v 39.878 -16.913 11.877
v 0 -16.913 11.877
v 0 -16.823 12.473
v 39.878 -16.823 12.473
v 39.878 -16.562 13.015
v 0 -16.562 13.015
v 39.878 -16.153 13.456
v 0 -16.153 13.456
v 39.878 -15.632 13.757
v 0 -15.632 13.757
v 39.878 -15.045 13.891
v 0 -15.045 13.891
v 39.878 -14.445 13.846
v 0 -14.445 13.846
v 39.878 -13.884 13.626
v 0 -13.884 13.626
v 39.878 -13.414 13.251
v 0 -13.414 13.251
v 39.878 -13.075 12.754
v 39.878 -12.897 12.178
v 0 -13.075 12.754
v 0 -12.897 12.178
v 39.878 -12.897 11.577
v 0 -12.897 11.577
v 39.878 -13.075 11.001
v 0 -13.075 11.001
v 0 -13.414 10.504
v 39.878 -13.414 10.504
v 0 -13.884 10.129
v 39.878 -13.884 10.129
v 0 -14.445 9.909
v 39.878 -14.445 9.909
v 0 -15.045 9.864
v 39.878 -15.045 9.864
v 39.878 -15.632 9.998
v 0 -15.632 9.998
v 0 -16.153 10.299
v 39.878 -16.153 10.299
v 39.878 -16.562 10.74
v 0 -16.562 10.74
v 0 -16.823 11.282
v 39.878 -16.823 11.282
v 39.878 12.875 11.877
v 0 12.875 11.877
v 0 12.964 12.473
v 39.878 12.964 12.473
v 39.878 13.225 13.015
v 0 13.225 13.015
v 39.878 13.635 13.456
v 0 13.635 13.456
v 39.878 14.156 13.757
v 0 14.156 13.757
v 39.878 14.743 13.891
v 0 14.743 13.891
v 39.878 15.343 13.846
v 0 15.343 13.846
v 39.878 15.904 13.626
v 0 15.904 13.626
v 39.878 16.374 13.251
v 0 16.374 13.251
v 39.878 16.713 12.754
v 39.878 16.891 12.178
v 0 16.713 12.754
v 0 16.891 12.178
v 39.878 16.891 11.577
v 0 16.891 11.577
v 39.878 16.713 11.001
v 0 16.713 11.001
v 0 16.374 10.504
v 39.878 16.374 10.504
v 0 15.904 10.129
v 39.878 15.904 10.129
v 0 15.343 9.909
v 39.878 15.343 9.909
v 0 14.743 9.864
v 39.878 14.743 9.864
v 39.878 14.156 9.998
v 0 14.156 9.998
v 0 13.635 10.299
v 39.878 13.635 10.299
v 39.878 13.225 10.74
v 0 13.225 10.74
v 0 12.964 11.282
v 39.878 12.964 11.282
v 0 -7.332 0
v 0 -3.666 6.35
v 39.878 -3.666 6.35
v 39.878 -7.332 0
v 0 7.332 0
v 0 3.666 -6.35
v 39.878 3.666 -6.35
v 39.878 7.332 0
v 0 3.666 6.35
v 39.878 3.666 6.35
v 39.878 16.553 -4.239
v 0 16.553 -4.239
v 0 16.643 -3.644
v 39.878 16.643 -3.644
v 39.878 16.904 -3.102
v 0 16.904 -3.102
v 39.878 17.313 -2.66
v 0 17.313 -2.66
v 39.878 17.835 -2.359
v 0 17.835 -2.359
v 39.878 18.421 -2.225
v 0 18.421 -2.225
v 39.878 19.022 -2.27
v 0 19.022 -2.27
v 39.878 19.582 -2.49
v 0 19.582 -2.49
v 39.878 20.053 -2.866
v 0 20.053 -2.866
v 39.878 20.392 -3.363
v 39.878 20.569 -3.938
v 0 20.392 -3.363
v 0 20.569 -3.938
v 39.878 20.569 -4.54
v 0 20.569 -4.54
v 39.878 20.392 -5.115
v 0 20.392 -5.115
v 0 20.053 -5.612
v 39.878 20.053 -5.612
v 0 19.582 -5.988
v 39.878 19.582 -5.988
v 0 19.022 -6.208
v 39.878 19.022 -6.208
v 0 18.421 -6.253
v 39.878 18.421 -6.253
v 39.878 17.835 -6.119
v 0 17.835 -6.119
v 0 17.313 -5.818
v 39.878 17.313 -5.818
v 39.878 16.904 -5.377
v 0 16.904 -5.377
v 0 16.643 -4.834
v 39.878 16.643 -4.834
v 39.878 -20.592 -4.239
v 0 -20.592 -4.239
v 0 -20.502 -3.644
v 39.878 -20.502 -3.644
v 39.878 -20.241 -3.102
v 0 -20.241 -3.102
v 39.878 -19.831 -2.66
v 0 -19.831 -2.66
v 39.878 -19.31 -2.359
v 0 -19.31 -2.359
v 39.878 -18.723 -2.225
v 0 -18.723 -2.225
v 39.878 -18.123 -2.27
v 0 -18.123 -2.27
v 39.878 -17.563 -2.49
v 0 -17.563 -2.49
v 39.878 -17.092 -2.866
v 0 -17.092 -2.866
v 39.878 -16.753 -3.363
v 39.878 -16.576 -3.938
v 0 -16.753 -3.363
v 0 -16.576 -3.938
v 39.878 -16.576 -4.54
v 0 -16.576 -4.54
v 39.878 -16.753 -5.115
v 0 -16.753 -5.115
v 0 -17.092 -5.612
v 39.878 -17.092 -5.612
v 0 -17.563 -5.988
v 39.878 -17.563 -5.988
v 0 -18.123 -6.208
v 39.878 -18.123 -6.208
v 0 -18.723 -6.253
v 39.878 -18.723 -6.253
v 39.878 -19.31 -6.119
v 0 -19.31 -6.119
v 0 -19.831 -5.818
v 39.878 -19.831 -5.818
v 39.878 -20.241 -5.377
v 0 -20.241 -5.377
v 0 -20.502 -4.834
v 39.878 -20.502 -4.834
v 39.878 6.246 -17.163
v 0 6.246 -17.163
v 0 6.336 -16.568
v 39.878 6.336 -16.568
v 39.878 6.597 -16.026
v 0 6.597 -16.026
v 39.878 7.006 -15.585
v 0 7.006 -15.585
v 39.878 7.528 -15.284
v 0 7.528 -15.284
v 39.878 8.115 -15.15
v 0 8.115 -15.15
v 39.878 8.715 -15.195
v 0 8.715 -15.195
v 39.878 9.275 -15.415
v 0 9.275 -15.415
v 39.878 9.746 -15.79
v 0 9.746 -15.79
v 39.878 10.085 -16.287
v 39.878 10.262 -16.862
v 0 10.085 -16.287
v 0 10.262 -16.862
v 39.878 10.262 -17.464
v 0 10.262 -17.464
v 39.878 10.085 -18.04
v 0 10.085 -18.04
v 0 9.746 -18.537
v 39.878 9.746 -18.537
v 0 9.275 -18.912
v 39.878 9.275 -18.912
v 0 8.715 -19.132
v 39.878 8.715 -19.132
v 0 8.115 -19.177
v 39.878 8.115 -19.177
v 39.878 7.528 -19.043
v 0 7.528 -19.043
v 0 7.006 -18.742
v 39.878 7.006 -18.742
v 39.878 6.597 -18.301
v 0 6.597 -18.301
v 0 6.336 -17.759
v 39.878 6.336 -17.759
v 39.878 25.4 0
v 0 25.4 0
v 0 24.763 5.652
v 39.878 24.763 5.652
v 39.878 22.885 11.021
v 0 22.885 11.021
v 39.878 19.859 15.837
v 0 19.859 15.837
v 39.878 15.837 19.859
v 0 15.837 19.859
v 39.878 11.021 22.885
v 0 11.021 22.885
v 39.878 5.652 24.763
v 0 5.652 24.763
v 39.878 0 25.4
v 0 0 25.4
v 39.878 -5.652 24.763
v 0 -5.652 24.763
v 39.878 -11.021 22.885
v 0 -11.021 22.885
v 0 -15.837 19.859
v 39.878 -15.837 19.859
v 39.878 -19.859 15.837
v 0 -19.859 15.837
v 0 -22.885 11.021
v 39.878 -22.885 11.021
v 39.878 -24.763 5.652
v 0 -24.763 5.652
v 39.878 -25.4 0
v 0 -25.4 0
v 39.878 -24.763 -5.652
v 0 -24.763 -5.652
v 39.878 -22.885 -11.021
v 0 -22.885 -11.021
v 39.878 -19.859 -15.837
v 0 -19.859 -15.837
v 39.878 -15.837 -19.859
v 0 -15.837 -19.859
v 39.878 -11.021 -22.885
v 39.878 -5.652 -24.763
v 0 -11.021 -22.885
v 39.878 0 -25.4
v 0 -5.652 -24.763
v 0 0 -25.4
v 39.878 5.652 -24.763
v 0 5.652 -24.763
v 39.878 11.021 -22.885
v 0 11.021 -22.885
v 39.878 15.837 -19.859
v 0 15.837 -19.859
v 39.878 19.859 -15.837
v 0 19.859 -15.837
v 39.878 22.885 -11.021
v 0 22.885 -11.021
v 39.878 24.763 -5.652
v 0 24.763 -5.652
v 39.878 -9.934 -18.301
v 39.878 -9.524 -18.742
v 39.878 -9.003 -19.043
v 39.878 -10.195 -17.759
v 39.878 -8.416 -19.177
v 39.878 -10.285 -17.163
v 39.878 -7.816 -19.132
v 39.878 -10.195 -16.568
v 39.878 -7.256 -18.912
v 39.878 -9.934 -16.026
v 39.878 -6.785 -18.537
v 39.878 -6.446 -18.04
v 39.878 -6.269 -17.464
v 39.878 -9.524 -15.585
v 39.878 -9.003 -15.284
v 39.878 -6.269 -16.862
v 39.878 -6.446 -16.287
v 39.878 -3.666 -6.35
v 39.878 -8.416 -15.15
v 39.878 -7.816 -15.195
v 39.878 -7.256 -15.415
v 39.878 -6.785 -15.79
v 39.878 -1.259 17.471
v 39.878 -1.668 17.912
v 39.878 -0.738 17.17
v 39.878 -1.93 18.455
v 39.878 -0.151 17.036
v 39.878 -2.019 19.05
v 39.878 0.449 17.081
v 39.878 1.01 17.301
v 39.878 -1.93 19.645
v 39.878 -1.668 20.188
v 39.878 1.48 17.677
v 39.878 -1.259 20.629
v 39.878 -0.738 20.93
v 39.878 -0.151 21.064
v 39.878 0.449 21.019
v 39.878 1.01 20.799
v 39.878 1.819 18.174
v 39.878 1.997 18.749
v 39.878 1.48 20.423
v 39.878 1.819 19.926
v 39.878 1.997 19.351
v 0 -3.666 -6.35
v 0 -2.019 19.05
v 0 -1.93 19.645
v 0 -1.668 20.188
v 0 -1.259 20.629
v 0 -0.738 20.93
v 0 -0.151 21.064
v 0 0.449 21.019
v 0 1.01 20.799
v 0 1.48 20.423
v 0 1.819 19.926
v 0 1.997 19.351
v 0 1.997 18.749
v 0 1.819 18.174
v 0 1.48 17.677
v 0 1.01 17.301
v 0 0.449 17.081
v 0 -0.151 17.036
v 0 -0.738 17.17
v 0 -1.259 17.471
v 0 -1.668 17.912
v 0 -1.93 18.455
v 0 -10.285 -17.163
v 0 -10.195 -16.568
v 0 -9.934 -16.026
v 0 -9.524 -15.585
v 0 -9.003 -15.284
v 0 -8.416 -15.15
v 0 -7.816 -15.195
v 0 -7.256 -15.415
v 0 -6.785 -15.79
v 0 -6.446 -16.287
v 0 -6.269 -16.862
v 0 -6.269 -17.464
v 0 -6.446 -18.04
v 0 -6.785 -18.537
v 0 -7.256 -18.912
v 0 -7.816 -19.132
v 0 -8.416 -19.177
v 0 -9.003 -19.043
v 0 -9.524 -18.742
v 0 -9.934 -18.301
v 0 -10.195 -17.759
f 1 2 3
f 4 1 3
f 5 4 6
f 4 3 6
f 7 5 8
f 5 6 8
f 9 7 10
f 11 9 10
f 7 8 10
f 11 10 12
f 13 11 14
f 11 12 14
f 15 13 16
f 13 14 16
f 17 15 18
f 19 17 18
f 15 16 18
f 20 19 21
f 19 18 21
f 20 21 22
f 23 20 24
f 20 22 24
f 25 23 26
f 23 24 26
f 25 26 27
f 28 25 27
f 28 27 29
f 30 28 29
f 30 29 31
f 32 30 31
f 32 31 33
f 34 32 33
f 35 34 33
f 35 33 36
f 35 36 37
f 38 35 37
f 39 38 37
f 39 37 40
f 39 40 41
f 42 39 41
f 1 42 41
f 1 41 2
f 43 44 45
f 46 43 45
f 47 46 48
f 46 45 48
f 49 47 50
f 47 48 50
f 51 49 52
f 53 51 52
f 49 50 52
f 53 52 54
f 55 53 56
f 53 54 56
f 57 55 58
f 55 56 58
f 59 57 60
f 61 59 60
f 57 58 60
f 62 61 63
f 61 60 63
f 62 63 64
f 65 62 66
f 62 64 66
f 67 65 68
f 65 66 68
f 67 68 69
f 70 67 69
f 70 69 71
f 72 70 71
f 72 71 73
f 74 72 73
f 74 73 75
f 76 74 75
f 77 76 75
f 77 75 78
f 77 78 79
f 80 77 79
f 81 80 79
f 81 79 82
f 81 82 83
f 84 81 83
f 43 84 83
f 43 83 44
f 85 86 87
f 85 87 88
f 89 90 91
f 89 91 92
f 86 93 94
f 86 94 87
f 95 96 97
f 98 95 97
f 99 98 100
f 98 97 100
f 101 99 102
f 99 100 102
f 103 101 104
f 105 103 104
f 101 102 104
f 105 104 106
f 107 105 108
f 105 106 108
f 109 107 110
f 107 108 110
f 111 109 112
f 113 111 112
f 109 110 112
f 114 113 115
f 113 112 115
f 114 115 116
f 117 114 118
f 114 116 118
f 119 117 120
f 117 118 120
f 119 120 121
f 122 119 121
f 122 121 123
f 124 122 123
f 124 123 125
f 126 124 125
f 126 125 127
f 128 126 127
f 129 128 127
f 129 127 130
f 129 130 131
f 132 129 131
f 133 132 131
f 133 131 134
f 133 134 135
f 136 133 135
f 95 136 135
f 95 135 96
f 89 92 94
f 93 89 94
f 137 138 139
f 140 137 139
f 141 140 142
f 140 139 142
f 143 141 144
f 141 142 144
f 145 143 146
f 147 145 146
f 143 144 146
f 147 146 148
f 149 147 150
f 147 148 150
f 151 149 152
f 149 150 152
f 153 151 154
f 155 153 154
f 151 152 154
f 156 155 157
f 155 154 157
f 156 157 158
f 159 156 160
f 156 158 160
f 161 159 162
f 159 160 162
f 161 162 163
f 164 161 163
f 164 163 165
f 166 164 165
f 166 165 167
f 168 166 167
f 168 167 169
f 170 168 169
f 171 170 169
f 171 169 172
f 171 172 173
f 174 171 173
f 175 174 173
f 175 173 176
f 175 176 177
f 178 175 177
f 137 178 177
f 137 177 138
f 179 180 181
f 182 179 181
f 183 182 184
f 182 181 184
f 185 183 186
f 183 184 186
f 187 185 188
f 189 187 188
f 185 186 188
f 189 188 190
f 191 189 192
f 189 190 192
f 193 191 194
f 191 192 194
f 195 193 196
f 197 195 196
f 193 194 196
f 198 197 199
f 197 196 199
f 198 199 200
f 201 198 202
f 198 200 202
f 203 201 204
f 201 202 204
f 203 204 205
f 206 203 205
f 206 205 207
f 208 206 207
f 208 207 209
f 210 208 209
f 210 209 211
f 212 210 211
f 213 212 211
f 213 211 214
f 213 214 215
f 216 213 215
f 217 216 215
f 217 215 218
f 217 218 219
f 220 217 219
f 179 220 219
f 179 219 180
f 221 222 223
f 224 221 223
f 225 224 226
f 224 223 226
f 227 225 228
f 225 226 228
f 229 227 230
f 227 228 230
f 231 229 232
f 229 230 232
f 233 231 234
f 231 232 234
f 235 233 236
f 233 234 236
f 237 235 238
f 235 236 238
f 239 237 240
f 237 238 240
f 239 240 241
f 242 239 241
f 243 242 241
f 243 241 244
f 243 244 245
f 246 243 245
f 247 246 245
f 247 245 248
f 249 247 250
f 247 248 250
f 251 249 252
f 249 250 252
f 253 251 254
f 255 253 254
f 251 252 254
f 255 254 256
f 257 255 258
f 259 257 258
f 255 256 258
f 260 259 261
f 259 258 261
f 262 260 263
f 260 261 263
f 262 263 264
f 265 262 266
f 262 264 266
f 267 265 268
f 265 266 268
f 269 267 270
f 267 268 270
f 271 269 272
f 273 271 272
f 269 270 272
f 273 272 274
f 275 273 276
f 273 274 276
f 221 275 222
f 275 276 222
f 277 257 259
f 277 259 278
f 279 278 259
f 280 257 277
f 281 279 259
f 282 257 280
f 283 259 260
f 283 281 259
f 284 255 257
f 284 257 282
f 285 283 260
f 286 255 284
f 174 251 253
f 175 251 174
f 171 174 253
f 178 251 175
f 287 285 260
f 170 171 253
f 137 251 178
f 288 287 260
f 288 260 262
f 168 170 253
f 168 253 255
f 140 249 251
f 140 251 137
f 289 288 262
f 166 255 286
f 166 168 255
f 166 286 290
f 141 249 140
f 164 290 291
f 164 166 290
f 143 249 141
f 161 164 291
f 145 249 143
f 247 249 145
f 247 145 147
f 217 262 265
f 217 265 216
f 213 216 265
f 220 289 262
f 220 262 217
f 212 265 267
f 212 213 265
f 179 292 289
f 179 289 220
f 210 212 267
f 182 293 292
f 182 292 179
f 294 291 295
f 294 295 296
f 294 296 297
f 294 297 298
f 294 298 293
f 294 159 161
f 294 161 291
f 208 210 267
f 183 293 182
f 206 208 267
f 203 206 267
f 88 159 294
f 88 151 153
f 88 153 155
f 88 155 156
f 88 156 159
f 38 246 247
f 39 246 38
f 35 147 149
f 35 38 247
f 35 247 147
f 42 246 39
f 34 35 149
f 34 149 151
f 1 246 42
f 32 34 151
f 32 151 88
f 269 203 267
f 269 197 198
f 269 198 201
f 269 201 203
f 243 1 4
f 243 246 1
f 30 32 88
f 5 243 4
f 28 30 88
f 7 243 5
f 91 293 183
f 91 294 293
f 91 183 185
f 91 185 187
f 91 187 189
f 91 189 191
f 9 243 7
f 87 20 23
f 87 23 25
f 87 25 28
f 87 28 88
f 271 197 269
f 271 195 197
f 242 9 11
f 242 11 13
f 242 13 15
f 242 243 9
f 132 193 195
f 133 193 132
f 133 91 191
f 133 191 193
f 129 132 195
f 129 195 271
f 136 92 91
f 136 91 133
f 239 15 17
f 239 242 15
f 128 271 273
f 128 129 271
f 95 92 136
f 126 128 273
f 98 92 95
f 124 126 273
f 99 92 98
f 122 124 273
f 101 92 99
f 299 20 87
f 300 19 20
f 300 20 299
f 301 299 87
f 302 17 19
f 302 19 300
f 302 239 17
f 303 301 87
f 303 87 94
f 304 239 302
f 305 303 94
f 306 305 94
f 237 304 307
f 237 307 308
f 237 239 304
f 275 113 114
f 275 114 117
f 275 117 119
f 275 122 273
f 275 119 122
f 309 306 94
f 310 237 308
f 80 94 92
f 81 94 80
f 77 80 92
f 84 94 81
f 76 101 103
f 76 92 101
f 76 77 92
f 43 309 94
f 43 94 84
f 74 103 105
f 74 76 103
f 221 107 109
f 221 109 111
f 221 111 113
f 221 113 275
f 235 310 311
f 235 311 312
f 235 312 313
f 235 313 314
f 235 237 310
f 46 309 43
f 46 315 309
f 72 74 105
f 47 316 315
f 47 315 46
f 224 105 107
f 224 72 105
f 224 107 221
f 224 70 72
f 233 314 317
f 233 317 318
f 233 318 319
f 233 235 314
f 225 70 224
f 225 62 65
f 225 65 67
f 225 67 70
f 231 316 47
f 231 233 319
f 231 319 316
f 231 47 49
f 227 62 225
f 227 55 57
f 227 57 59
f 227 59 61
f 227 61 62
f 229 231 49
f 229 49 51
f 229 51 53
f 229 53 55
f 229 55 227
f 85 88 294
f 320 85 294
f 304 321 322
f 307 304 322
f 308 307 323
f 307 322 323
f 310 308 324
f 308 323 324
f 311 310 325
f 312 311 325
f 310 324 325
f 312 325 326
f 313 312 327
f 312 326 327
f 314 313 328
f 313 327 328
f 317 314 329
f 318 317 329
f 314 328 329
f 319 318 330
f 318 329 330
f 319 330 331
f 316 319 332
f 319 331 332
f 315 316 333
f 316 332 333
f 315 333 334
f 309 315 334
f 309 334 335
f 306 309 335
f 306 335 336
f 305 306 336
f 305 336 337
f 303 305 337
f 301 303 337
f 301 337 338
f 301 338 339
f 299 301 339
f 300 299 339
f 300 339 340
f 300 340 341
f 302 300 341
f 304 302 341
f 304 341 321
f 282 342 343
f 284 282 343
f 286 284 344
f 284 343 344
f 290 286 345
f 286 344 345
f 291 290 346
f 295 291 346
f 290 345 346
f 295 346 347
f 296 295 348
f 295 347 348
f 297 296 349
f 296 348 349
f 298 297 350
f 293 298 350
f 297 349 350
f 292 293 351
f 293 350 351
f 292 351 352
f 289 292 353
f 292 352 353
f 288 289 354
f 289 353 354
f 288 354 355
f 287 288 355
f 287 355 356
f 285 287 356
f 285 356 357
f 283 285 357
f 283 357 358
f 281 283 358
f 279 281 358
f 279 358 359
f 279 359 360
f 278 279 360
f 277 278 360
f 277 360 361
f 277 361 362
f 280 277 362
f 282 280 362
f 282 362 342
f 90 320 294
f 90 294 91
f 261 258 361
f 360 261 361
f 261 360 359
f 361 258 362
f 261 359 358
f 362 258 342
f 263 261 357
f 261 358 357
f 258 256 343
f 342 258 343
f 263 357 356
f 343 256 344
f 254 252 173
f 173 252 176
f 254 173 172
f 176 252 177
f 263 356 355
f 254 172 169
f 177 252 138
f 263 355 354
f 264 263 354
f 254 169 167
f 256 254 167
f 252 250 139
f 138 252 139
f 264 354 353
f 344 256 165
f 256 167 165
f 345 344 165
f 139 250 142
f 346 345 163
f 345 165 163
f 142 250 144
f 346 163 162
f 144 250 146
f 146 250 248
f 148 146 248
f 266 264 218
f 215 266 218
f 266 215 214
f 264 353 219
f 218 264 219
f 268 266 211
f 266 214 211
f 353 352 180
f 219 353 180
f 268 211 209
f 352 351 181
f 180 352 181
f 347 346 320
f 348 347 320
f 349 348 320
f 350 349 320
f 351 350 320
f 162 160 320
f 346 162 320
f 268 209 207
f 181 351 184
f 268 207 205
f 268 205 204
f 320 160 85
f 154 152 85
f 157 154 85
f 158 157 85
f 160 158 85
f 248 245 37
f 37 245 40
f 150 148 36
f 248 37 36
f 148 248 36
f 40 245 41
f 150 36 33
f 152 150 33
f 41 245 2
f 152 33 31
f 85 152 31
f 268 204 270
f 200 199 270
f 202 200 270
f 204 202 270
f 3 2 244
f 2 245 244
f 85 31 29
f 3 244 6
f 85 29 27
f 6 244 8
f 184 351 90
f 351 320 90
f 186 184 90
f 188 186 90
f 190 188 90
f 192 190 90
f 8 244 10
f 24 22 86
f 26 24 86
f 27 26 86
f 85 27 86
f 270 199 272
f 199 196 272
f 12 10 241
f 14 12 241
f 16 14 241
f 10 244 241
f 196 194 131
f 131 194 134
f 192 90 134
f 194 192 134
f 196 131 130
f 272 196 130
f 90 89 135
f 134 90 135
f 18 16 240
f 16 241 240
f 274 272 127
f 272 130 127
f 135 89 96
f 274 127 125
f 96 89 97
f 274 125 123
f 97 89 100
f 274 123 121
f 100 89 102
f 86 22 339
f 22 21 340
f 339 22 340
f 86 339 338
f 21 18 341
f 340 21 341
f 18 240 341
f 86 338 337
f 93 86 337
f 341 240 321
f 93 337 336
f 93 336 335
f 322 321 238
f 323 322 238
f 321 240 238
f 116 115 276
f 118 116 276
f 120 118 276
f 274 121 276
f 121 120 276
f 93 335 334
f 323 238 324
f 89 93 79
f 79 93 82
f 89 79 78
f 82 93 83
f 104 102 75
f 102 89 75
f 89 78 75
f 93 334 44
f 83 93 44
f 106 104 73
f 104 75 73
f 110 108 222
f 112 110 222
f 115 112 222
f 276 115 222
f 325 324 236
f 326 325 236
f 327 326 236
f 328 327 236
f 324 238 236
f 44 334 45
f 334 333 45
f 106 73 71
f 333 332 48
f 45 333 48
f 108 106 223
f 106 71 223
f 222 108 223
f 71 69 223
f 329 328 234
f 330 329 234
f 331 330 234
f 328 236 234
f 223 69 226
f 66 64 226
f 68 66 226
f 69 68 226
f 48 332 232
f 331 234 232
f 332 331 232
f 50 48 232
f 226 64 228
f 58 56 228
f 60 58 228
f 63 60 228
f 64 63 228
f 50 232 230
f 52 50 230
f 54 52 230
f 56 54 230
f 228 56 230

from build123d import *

# Parameters (mm, degrees)
SKETCH2_R                  = 25.4
BOSS_EXTRUDE1_DEPTH        = 39.878
TAP_DRILL_FOR_10_32_TAP1_D = 4.0386


with BuildPart() as part:
    # Sketch2 → Boss-Extrude1 (new body)
    with BuildSketch(Plane.YZ):
        Circle(SKETCH2_R)
        Polygon((3.666174209, 6.35), (-3.666174209, 6.35), (-7.332348419, 0), (-3.666174209, -6.35), (3.666174209, -6.35), (7.332348419, 0), align=None, mode=Mode.SUBTRACT)
    extrude(amount=BOSS_EXTRUDE1_DEPTH)

    # Tap Drill for #10-32 Tap1 (through all)
    with Locations(Plane.YZ.offset(39.878)):
        with Locations((-14.893889741, 11.877480725), (0, 19.05), (14.893889741, 11.877480725), (18.572376727, -4.239023792), (8.26548523, -17.163456934), (-8.26548523, -17.163456934), (-18.572376727, -4.239023792)):
            Hole(TAP_DRILL_FOR_10_32_TAP1_D / 2)


solid = part.part
